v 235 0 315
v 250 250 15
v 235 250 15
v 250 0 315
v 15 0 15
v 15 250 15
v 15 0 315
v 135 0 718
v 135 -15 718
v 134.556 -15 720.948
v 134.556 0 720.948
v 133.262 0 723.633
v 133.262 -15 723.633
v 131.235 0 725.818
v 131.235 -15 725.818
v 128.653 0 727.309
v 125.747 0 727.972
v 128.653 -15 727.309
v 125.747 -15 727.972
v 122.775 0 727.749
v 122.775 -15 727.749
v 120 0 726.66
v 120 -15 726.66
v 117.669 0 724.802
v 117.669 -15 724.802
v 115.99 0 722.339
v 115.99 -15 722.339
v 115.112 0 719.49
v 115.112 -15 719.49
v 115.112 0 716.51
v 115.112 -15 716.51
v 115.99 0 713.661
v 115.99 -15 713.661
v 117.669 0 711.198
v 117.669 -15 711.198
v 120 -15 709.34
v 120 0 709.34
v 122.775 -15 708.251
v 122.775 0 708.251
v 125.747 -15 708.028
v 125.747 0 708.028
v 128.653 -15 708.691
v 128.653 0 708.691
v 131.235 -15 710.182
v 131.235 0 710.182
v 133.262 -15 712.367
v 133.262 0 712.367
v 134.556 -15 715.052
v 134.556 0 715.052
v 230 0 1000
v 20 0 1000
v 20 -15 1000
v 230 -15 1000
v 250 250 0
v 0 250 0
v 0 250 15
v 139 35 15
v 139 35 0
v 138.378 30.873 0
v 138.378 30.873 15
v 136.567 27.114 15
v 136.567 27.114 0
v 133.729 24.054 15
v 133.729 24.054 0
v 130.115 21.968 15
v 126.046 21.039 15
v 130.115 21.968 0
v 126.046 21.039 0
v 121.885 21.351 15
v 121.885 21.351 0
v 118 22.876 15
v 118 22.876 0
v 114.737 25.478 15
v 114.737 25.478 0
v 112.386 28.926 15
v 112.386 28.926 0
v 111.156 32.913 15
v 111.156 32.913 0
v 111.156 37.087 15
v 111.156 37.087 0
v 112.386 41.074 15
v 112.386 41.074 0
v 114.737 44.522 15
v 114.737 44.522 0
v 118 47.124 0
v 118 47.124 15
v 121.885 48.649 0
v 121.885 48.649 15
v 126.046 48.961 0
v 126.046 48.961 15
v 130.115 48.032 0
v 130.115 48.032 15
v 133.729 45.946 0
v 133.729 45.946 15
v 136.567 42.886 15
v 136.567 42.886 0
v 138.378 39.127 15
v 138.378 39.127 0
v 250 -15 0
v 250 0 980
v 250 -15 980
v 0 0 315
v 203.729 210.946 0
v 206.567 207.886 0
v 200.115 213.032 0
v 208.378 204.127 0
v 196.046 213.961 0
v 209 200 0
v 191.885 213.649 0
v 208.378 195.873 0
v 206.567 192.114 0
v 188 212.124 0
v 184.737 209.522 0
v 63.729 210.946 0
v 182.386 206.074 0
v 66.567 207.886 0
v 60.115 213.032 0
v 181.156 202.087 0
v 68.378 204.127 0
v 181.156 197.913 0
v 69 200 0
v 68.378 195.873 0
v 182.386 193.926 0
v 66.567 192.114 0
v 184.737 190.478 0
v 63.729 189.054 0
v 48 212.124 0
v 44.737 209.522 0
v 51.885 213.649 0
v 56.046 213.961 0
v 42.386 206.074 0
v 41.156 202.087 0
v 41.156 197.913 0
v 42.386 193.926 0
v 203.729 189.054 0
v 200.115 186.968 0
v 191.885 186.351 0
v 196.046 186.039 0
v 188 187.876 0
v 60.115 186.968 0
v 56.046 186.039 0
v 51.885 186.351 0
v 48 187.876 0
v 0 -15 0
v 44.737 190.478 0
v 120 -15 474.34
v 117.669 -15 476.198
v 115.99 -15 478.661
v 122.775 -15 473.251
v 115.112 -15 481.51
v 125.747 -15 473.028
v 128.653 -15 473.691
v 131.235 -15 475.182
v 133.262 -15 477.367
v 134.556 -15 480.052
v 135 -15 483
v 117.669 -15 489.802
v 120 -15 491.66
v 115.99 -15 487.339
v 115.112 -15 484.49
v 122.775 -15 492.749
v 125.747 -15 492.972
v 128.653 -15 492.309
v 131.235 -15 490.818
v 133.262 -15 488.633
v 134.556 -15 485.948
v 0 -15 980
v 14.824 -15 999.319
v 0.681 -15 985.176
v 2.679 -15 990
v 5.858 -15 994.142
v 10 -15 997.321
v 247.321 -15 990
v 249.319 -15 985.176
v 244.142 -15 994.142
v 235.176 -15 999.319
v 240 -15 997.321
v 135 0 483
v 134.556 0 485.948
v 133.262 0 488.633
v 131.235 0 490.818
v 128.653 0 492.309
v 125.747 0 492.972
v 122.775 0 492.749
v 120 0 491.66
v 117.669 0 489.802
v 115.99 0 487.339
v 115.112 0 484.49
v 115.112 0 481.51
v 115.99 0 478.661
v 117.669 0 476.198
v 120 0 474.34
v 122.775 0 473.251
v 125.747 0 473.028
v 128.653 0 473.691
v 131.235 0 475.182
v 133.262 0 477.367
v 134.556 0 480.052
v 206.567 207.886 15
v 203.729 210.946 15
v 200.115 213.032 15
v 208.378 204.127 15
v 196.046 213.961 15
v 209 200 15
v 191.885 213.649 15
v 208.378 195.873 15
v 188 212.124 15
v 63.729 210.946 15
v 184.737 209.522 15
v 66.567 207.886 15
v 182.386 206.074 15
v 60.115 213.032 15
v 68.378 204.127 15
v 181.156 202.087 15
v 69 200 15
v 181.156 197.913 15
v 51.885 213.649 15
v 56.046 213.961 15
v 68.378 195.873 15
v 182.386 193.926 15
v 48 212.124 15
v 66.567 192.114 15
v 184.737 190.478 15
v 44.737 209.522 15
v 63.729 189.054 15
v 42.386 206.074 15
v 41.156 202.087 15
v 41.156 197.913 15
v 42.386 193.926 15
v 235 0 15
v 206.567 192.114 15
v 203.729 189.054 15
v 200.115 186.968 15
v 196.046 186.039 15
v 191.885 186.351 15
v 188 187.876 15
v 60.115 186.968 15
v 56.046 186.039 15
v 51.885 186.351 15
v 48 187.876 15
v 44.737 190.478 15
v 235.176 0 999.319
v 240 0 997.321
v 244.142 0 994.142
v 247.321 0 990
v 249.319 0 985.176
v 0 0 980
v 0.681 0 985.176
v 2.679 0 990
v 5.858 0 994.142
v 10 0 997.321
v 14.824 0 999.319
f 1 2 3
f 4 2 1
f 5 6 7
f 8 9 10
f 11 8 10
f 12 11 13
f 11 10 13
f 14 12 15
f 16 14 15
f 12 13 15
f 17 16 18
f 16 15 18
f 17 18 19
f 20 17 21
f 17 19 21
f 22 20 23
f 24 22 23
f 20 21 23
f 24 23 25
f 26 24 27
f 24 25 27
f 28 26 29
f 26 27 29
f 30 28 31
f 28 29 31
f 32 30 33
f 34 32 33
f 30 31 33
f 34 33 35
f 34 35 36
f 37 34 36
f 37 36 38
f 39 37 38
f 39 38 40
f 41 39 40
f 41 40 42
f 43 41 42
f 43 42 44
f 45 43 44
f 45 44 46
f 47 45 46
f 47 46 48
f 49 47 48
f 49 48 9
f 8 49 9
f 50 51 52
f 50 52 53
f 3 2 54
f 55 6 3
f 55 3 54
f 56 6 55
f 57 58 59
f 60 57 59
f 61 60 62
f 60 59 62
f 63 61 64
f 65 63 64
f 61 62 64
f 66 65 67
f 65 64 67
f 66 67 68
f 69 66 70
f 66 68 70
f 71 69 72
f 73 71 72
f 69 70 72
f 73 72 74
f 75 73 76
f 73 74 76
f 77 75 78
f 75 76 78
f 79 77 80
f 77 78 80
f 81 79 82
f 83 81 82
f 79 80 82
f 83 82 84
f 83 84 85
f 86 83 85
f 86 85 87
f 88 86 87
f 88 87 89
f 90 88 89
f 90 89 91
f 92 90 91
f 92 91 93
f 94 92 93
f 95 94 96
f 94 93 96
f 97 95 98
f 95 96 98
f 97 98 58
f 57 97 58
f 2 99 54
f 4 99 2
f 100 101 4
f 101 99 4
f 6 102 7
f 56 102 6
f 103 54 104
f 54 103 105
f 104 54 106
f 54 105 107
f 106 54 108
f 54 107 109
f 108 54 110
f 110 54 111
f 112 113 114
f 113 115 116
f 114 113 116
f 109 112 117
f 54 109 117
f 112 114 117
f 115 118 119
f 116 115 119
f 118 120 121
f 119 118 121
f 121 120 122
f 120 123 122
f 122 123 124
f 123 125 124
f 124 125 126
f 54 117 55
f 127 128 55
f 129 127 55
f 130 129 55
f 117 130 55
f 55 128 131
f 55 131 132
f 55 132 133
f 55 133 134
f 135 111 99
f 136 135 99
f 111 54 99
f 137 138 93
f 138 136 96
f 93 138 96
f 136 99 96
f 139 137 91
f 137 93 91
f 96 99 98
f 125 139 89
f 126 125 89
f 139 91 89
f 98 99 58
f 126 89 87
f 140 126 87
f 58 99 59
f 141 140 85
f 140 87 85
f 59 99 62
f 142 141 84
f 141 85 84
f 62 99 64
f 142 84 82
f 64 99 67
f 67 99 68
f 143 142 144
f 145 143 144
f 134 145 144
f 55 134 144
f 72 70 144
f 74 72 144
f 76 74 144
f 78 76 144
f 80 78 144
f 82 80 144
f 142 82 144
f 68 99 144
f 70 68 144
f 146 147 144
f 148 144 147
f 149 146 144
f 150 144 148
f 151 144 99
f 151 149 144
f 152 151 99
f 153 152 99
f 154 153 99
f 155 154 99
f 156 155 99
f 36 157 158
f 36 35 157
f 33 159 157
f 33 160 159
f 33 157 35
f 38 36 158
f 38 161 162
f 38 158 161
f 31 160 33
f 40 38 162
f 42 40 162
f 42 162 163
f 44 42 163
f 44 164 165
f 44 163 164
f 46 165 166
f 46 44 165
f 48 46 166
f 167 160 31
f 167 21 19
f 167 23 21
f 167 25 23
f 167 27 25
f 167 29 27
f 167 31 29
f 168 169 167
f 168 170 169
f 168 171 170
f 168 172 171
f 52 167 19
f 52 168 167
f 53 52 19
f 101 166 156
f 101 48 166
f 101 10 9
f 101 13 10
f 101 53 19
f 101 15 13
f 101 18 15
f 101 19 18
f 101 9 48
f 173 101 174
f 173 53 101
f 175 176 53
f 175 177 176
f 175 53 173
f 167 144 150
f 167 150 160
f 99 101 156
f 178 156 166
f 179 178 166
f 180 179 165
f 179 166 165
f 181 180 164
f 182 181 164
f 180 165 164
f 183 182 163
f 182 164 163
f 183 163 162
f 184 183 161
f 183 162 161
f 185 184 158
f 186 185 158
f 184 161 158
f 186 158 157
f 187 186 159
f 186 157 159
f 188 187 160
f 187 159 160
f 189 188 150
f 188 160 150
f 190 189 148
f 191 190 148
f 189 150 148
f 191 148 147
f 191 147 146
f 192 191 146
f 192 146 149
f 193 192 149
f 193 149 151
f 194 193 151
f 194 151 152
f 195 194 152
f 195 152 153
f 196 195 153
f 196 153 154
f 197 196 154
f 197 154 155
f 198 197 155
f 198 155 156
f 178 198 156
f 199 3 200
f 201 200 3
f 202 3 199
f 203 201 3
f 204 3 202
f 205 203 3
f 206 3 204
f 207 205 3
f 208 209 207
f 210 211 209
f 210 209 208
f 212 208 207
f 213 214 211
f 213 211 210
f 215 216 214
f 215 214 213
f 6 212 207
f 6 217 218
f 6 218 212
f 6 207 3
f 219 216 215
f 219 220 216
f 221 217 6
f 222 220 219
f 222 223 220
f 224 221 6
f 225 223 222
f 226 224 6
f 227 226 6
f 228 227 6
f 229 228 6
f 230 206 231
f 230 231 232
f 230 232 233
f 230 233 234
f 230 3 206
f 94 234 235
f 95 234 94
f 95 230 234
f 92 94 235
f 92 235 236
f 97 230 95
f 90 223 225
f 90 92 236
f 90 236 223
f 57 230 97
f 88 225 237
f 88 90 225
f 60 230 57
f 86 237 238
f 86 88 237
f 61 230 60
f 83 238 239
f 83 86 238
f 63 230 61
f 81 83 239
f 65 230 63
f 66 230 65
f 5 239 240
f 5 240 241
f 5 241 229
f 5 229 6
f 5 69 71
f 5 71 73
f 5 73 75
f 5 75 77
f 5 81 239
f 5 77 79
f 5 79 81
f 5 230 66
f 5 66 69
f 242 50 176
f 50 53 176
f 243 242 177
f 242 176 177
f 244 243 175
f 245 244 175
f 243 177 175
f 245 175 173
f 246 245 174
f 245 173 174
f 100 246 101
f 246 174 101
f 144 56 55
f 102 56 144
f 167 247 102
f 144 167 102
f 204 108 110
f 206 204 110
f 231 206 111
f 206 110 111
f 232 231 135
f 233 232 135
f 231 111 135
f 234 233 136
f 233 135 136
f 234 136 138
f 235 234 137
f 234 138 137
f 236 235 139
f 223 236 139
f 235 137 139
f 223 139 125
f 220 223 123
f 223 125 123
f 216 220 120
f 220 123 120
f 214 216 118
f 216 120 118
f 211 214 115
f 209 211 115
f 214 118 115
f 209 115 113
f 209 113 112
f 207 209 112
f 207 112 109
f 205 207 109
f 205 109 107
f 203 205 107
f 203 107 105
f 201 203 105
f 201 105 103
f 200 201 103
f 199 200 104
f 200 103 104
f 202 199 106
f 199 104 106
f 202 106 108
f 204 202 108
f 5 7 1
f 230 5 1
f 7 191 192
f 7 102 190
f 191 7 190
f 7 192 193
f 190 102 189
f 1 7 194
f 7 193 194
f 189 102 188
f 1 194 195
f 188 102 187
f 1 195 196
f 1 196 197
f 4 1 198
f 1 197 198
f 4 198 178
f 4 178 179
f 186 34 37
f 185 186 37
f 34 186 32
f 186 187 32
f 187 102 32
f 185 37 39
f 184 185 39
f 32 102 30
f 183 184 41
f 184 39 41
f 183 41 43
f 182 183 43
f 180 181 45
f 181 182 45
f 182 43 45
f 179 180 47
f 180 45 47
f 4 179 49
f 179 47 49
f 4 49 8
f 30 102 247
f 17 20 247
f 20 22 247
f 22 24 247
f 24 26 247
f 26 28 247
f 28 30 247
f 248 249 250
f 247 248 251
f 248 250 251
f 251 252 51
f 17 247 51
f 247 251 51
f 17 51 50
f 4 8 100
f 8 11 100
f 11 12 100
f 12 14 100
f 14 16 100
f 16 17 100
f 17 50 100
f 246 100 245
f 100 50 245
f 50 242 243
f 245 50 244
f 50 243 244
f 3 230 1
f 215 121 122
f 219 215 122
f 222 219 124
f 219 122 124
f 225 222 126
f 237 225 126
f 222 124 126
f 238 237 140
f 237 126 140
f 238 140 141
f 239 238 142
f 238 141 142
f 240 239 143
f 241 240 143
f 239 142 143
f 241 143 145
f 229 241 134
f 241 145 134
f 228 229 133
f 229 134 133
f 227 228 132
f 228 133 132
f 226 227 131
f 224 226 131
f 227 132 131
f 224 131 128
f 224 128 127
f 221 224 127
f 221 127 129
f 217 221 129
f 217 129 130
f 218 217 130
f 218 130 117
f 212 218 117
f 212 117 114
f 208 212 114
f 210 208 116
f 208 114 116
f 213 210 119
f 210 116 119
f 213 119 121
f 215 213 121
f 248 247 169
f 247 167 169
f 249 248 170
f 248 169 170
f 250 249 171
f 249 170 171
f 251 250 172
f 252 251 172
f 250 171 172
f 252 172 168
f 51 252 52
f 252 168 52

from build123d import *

# Parameters (mm, degrees)
F0_W      = 250
F0_H      = 1000
F1_DEPTH  = 15
F2_R      = 20
F3_R      = 20
F4_W      = 250
F4_H      = 15
F5_DEPTH  = 250
F7_DEPTH  = 15
F9_DEPTH  = 15
F10_R     = 14
F11_DEPTH = 15
F12_R     = 10
F13_DEPTH = 265.001


with BuildPart() as f1:
    # F0 (on Front) → F1 (new body)
    with BuildSketch(Plane.XZ):
        with Locations((125, 500)):
            Rectangle(F0_W, F0_H)
    extrude(amount=F1_DEPTH)

    # F2
    f2_edges = [f1.edges().sort_by_distance(p)[0] for p in [
        (0, -7.5, 1000),
    ]]
    fillet(f2_edges, radius=F2_R)

    # F3
    f3_edges = [f1.edges().sort_by_distance(p)[0] for p in [
        (250, -7.5, 1000),
    ]]
    fillet(f3_edges, radius=F3_R)

    # F4 (on face) → F5 (join)
    with BuildSketch(Plane(origin=(0, 0, 0), x_dir=(-1, 0, 0), z_dir=(0, 1, 0))):
        with Locations((-125, 7.5)):
            Rectangle(F4_W, F4_H)
    extrude(amount=F5_DEPTH)

    # F6 (on face) → F7 (join)
    with BuildSketch(Plane(origin=(0, 0, 0), x_dir=(0, -1, 0), z_dir=(-1, 0, 0))):
        Polygon((0, 315), (-250, 15), (0, 15), align=None)
    extrude(amount=-F7_DEPTH)

    # F8 (on face) → F9 (join)
    with BuildSketch(Plane.YZ.offset(250)):
        Polygon((0, 15), (250, 15), (0, 315), align=None)
    extrude(amount=-F9_DEPTH)

    # F10 (on face) → F11 (cut)
    with BuildSketch(Plane(origin=(0, 0, 0), x_dir=(1, 0, 0), z_dir=(0, 0, -1))):
        with Locations((125, -35)):
            Circle(F10_R)
        with Locations((195, -200)):
            Circle(F10_R)
        with Locations((55, -200)):
            Circle(F10_R)
    extrude(amount=-F11_DEPTH, mode=Mode.SUBTRACT)

    # F12 (on face) → F13 (cut, through all)
    with BuildSketch(Plane.XZ.offset(15)):
        with Locations((125, 718)):
            Circle(F12_R)
        with Locations((125, 483)):
            Circle(F12_R)
    extrude(amount=-F13_DEPTH, mode=Mode.SUBTRACT)


solid = f1.part
